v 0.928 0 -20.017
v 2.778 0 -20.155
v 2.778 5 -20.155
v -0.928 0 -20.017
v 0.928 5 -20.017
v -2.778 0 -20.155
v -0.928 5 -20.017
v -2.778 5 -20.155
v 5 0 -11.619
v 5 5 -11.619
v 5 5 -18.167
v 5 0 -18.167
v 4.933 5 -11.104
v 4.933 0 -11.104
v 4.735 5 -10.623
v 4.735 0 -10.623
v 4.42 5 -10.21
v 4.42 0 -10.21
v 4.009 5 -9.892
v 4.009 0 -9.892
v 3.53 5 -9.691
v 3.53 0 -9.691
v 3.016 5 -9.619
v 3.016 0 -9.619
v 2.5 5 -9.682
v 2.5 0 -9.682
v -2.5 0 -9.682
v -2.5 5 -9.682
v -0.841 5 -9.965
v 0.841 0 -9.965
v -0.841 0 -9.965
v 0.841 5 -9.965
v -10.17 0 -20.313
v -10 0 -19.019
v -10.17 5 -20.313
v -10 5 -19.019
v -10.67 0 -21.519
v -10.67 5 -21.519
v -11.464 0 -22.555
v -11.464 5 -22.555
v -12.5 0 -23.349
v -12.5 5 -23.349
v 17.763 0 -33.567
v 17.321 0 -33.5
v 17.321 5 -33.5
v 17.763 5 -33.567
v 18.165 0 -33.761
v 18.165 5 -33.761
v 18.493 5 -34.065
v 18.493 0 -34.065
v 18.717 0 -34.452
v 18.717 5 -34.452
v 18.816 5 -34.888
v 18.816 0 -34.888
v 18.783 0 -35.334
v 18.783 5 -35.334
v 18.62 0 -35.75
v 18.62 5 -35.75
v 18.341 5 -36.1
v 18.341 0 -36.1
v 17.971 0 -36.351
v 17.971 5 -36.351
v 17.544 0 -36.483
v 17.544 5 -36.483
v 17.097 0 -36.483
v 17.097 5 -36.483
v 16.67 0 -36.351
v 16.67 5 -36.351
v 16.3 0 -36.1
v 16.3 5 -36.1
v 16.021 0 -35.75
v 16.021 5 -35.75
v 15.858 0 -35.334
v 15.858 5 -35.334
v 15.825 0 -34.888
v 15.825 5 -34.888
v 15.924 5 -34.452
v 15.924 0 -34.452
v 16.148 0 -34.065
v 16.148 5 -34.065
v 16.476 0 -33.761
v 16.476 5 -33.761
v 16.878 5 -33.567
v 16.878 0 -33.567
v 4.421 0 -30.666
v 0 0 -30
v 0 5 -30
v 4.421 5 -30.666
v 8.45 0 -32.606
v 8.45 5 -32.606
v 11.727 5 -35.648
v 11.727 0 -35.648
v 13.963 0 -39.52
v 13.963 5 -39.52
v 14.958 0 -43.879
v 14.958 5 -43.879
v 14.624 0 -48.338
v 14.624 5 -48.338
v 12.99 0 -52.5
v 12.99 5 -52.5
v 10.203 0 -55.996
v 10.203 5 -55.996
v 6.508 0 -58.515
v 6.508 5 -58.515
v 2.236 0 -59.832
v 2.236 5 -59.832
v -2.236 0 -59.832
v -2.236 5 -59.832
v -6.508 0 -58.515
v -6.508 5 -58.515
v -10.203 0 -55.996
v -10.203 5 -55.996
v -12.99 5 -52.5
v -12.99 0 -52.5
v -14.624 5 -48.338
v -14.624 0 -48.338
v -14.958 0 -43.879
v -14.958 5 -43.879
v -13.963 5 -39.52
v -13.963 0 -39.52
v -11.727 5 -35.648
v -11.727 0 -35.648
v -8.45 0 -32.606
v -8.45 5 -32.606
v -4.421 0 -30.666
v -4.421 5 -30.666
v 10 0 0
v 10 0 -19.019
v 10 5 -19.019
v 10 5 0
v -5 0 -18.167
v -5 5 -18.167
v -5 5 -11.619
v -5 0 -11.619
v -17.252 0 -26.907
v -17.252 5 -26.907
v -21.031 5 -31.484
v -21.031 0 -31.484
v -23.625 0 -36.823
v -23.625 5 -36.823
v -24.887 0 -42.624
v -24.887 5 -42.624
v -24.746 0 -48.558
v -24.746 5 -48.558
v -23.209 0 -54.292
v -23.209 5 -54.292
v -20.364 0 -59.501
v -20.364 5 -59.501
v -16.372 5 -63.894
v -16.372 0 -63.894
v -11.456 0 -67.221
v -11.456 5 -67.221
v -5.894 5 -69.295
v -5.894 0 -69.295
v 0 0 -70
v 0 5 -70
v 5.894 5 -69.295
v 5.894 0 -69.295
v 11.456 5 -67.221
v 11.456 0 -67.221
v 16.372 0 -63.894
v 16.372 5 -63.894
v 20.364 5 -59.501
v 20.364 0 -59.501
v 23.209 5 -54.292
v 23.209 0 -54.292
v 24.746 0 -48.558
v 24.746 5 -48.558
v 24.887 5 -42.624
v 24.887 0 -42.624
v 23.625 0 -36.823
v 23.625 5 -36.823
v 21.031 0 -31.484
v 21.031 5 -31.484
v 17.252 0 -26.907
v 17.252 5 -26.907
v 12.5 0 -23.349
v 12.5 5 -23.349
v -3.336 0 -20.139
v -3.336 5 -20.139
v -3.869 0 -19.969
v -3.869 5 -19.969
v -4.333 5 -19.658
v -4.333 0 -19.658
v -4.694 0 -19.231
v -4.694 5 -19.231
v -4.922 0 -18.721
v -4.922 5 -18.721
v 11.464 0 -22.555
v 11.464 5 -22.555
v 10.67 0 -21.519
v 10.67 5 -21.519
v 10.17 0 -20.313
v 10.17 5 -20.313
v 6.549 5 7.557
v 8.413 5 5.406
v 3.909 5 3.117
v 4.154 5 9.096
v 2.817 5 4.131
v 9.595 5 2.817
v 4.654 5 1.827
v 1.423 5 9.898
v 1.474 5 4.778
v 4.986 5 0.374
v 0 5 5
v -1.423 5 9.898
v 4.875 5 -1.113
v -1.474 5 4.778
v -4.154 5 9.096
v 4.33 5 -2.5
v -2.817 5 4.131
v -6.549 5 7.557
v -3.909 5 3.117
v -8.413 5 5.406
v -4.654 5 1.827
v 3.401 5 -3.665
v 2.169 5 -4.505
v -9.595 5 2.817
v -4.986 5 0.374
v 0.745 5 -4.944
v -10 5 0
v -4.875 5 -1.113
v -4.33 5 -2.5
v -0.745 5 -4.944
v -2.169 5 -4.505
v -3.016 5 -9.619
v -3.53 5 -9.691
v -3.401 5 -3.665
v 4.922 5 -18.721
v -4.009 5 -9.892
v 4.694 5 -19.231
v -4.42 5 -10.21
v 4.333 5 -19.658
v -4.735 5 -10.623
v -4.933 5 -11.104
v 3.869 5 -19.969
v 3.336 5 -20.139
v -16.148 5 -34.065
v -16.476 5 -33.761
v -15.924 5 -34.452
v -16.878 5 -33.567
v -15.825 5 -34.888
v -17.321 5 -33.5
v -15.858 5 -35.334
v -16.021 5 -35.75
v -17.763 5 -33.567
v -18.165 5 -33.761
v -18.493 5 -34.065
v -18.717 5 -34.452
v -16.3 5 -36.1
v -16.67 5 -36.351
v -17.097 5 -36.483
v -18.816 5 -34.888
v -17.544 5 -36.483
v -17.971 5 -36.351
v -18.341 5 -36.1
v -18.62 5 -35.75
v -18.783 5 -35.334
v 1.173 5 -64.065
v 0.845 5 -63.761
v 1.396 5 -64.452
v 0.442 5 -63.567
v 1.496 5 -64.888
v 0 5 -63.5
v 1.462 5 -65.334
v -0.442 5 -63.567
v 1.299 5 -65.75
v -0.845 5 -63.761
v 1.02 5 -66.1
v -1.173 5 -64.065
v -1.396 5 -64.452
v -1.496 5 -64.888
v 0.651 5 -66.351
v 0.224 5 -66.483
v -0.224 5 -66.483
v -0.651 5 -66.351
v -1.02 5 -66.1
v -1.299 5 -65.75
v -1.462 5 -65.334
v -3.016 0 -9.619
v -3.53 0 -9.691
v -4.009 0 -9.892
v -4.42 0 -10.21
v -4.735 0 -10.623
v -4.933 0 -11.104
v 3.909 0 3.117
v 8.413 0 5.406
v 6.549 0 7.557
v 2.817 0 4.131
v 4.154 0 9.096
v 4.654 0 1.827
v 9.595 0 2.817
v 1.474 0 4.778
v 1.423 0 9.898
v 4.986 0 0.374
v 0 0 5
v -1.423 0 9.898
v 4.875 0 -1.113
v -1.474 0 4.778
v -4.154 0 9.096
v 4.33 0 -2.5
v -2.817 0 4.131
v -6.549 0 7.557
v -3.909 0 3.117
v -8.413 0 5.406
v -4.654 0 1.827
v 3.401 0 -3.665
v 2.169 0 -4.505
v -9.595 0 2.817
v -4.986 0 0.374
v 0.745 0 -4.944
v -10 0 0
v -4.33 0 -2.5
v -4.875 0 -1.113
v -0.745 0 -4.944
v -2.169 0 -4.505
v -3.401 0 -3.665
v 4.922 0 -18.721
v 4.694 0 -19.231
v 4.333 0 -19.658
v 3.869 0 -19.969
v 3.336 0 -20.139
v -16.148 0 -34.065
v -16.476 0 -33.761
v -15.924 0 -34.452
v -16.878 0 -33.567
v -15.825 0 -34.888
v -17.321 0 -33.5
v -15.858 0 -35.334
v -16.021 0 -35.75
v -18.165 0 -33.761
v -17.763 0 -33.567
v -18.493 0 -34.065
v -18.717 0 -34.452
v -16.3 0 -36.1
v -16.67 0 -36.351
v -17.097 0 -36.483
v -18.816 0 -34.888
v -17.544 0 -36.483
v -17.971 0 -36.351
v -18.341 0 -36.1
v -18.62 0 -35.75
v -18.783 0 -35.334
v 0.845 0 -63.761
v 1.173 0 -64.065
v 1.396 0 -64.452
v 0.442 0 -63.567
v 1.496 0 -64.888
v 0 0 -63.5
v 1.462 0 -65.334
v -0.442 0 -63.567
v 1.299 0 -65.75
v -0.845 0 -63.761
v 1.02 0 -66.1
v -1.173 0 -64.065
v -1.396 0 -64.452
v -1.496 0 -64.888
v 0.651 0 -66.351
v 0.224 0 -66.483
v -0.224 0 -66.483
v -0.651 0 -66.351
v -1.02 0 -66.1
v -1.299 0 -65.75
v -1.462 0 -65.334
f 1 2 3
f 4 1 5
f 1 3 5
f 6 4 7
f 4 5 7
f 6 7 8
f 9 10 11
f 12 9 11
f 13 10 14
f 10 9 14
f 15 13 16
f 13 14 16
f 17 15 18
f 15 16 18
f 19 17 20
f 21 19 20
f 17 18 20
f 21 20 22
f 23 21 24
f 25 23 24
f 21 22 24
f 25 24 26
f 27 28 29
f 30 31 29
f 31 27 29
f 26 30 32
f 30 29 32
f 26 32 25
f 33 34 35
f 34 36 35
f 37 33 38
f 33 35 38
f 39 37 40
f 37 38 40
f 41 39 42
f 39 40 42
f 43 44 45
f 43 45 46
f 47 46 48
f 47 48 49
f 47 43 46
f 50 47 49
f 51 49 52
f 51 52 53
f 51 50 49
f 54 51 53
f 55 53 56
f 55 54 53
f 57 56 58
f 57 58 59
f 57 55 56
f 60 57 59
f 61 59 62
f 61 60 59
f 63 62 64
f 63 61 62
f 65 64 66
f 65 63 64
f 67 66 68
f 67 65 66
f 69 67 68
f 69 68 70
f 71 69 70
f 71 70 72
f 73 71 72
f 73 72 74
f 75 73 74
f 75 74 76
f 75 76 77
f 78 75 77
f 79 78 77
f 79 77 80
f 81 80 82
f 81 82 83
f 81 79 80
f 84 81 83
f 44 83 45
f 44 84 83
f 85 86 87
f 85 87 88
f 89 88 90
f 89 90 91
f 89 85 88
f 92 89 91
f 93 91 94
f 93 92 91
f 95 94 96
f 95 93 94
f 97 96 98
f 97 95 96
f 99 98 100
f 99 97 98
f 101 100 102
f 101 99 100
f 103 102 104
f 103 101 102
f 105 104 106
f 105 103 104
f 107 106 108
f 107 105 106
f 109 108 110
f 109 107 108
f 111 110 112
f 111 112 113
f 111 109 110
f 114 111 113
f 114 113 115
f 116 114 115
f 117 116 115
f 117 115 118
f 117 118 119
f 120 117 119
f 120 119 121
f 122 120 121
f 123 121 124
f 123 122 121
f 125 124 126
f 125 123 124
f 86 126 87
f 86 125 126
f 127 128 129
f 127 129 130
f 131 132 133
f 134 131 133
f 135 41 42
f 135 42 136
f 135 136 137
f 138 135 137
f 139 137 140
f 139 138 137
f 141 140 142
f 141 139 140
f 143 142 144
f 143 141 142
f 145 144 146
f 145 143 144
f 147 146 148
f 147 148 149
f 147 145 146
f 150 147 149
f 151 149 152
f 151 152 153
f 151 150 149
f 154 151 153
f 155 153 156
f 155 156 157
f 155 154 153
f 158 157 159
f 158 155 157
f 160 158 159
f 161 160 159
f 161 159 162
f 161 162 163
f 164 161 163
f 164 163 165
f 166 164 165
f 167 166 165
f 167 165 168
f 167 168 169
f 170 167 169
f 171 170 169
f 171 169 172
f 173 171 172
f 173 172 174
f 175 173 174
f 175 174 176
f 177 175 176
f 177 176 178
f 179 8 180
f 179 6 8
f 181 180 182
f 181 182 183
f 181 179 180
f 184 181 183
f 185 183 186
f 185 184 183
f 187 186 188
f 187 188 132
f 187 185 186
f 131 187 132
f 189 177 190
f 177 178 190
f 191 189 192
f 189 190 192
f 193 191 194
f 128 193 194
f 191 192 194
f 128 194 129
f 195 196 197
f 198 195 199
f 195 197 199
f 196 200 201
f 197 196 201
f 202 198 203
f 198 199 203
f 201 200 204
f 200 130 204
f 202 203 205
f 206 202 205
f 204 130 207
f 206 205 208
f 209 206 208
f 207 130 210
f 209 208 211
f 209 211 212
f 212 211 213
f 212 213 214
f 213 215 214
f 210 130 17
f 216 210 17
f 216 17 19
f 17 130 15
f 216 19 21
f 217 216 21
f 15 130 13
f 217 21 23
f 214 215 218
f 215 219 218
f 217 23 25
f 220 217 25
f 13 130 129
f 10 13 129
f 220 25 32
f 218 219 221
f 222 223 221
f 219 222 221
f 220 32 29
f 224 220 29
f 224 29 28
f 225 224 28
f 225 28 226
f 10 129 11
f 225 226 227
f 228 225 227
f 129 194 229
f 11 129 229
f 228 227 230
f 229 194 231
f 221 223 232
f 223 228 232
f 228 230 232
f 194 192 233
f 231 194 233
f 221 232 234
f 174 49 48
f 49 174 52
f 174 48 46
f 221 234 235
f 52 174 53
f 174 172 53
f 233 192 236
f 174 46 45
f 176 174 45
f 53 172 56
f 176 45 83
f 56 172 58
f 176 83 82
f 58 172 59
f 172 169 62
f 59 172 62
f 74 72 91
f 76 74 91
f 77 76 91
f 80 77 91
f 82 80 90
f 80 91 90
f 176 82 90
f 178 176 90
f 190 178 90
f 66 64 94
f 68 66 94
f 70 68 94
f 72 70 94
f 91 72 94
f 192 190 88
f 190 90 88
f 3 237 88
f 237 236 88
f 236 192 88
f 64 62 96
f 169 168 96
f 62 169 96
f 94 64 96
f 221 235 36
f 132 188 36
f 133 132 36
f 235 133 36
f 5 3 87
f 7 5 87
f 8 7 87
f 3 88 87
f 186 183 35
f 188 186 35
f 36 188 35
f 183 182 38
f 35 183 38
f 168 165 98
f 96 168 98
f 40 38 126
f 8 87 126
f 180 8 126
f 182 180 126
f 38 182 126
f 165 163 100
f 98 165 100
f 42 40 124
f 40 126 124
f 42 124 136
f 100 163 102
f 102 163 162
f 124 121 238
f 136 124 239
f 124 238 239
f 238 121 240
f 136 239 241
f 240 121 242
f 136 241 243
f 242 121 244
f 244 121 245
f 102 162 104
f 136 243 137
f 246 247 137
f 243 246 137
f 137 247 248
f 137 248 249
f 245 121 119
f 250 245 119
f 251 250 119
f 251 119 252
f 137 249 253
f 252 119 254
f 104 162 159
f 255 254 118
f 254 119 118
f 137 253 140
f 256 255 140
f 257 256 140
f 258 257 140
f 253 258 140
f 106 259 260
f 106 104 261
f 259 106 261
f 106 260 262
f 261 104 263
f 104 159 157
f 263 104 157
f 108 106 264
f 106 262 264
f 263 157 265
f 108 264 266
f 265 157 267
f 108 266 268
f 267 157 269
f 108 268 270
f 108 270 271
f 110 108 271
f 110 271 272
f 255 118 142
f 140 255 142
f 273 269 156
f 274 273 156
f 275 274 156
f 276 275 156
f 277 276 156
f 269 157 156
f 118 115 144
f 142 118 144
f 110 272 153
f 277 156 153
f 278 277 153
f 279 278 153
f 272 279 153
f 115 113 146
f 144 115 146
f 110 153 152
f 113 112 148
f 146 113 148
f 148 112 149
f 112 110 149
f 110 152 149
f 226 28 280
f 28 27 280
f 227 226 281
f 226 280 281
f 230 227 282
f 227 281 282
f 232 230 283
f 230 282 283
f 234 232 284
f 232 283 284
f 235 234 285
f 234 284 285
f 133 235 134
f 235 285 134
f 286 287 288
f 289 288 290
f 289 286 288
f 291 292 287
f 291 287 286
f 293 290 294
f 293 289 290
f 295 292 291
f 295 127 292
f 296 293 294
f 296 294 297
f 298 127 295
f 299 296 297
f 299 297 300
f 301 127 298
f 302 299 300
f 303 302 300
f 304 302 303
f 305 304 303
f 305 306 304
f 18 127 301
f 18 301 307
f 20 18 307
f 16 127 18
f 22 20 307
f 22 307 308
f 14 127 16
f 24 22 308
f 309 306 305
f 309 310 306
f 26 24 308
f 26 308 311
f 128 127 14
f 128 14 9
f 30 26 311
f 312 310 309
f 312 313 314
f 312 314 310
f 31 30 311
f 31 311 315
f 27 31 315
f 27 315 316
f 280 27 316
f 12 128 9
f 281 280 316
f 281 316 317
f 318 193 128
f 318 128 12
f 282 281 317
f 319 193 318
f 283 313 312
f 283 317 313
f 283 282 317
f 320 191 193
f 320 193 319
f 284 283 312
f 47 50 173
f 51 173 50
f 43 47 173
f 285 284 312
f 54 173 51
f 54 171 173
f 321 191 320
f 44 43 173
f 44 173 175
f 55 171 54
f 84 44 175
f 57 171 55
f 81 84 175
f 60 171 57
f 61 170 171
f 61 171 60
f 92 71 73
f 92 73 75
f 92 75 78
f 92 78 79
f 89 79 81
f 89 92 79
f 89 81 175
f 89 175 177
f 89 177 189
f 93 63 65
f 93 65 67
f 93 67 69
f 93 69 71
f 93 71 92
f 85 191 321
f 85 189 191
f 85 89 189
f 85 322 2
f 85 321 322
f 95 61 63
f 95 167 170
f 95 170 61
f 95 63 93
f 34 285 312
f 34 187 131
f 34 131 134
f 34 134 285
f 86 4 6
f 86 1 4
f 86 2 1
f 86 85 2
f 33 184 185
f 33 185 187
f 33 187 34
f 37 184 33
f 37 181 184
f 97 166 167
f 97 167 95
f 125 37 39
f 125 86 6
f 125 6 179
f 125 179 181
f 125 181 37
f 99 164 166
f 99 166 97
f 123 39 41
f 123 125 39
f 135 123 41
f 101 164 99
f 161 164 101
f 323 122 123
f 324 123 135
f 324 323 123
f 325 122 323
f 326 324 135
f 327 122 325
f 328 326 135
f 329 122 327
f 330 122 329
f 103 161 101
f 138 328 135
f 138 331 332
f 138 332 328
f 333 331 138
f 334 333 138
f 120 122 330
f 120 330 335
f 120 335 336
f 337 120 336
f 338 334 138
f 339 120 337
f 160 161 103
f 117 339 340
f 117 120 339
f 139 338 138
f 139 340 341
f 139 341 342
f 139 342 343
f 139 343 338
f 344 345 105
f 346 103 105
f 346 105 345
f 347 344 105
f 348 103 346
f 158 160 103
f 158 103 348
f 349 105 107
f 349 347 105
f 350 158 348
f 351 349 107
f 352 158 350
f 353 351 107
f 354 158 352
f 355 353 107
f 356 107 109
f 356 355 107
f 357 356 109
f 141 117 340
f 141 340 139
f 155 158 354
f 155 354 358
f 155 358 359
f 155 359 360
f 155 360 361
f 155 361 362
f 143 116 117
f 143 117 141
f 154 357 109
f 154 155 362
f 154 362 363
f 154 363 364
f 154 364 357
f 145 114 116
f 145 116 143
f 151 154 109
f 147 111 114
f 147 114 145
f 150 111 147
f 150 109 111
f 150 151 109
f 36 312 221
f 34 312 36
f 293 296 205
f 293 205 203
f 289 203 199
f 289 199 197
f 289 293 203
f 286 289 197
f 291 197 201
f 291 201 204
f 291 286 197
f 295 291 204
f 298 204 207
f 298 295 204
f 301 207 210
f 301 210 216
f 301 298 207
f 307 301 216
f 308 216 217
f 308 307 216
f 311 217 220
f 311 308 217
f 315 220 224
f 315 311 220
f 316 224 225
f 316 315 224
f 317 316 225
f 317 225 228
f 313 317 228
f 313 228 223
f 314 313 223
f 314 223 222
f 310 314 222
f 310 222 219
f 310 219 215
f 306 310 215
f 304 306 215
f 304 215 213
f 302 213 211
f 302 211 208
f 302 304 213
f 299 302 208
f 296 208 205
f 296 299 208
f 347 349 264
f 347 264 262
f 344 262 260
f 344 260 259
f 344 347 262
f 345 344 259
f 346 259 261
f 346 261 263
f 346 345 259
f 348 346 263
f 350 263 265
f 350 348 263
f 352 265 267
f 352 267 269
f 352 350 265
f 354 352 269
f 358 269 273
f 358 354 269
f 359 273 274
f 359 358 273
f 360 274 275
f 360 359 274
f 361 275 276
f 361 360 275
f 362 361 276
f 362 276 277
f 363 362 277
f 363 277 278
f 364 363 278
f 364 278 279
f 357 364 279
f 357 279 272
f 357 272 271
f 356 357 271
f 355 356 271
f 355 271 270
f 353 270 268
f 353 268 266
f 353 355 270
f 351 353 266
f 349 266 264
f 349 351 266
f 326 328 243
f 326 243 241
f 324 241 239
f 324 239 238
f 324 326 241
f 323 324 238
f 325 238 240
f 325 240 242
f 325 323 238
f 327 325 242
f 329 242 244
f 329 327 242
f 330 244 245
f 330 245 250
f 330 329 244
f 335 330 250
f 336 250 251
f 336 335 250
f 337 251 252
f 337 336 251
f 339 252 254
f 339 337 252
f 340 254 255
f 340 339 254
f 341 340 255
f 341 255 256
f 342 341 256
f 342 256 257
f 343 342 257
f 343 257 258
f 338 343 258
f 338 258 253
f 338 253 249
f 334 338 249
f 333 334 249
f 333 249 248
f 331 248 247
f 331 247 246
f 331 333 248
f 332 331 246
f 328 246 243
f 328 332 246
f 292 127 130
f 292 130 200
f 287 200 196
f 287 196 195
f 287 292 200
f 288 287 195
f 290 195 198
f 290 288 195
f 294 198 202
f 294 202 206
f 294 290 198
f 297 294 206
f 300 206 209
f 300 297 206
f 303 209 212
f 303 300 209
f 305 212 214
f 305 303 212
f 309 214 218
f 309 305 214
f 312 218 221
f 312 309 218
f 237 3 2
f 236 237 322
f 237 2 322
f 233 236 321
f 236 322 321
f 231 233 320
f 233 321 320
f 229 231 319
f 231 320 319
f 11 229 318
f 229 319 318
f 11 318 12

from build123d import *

# Parameters (mm, degrees)
SKETCH_1_R          = 5
SKETCH_1_R_2        = 15
SKETCH_1_R_3        = 1.5
EXTRUDE_1_DEPTH     = 5
CUT_EXTRUDE_1_DEPTH = 75.498322129
FILLET_1_R          = 2
FILLET_2_R          = 5


with BuildPart() as part:
    # 草图1 → 凸台-拉伸1 (new body)
    with BuildSketch(Plane(origin=(0, 0, 0), x_dir=(1, 0, 0), z_dir=(0, 1, 0))):
        with BuildLine():
            Line((-10, 0), (-10, 22.087121525))
            ThreePointArc((-10, 22.087121525), (0, 70), (10, 22.087121525))
            Line((10, 22.087121525), (10, 0))
            ThreePointArc((10, 0), (0, -10), (-10, 0))
        make_face()
        with Locations(Location((0, 0, 0), (0, 0, 270))):
            Circle(SKETCH_1_R, mode=Mode.SUBTRACT)
        with Locations(Location((0, 45, 0), (0, 0, 270))):
            Circle(SKETCH_1_R_2, mode=Mode.SUBTRACT)
        with Locations(Location((0, 65, 0), (0, 0, 270))):
            Circle(SKETCH_1_R_3, mode=Mode.SUBTRACT)
        with Locations(Location((17.320508076, 35, 0), (0, 0, 270))):
            Circle(SKETCH_1_R_3, mode=Mode.SUBTRACT)
        with Locations(Location((-17.320508076, 35, 0), (0, 0, 270))):
            Circle(SKETCH_1_R_3, mode=Mode.SUBTRACT)
    extrude(amount=EXTRUDE_1_DEPTH)

    # 草图2 → 切除-拉伸1 (cut, through all)
    with BuildSketch(Plane(origin=(0, 5, 0), x_dir=(1, 0, 0), z_dir=(0, 1, 0))):
        with BuildLine():
            ThreePointArc((5, 20.505102572), (0, 20), (-5, 20.505102572))
            Line((-5, 20.505102572), (-5, 8.660254038))
            ThreePointArc((-5, 8.660254038), (0, 10), (5, 8.660254038))
            Line((5, 8.660254038), (5, 20.505102572))
        make_face()
    extrude(amount=-CUT_EXTRUDE_1_DEPTH, mode=Mode.SUBTRACT)

    # 圆角1
    fillet_1_edges = [part.edges().sort_by_distance(p)[0] for p in [
        (5, 2.5, -8.660254038),
        (-5, 2.5, -8.660254038),
        (-5, 2.5, -20.505102572),
        (5, 2.5, -20.505102572),
    ]]
    fillet(fillet_1_edges, radius=FILLET_1_R)

    # 圆角2
    fillet_2_edges = [part.edges().sort_by_distance(p)[0] for p in [
        (10, 2.5, -22.087121525),
        (-10, 2.5, -22.087121525),
    ]]
    fillet(fillet_2_edges, radius=FILLET_2_R)


solid = part.part
